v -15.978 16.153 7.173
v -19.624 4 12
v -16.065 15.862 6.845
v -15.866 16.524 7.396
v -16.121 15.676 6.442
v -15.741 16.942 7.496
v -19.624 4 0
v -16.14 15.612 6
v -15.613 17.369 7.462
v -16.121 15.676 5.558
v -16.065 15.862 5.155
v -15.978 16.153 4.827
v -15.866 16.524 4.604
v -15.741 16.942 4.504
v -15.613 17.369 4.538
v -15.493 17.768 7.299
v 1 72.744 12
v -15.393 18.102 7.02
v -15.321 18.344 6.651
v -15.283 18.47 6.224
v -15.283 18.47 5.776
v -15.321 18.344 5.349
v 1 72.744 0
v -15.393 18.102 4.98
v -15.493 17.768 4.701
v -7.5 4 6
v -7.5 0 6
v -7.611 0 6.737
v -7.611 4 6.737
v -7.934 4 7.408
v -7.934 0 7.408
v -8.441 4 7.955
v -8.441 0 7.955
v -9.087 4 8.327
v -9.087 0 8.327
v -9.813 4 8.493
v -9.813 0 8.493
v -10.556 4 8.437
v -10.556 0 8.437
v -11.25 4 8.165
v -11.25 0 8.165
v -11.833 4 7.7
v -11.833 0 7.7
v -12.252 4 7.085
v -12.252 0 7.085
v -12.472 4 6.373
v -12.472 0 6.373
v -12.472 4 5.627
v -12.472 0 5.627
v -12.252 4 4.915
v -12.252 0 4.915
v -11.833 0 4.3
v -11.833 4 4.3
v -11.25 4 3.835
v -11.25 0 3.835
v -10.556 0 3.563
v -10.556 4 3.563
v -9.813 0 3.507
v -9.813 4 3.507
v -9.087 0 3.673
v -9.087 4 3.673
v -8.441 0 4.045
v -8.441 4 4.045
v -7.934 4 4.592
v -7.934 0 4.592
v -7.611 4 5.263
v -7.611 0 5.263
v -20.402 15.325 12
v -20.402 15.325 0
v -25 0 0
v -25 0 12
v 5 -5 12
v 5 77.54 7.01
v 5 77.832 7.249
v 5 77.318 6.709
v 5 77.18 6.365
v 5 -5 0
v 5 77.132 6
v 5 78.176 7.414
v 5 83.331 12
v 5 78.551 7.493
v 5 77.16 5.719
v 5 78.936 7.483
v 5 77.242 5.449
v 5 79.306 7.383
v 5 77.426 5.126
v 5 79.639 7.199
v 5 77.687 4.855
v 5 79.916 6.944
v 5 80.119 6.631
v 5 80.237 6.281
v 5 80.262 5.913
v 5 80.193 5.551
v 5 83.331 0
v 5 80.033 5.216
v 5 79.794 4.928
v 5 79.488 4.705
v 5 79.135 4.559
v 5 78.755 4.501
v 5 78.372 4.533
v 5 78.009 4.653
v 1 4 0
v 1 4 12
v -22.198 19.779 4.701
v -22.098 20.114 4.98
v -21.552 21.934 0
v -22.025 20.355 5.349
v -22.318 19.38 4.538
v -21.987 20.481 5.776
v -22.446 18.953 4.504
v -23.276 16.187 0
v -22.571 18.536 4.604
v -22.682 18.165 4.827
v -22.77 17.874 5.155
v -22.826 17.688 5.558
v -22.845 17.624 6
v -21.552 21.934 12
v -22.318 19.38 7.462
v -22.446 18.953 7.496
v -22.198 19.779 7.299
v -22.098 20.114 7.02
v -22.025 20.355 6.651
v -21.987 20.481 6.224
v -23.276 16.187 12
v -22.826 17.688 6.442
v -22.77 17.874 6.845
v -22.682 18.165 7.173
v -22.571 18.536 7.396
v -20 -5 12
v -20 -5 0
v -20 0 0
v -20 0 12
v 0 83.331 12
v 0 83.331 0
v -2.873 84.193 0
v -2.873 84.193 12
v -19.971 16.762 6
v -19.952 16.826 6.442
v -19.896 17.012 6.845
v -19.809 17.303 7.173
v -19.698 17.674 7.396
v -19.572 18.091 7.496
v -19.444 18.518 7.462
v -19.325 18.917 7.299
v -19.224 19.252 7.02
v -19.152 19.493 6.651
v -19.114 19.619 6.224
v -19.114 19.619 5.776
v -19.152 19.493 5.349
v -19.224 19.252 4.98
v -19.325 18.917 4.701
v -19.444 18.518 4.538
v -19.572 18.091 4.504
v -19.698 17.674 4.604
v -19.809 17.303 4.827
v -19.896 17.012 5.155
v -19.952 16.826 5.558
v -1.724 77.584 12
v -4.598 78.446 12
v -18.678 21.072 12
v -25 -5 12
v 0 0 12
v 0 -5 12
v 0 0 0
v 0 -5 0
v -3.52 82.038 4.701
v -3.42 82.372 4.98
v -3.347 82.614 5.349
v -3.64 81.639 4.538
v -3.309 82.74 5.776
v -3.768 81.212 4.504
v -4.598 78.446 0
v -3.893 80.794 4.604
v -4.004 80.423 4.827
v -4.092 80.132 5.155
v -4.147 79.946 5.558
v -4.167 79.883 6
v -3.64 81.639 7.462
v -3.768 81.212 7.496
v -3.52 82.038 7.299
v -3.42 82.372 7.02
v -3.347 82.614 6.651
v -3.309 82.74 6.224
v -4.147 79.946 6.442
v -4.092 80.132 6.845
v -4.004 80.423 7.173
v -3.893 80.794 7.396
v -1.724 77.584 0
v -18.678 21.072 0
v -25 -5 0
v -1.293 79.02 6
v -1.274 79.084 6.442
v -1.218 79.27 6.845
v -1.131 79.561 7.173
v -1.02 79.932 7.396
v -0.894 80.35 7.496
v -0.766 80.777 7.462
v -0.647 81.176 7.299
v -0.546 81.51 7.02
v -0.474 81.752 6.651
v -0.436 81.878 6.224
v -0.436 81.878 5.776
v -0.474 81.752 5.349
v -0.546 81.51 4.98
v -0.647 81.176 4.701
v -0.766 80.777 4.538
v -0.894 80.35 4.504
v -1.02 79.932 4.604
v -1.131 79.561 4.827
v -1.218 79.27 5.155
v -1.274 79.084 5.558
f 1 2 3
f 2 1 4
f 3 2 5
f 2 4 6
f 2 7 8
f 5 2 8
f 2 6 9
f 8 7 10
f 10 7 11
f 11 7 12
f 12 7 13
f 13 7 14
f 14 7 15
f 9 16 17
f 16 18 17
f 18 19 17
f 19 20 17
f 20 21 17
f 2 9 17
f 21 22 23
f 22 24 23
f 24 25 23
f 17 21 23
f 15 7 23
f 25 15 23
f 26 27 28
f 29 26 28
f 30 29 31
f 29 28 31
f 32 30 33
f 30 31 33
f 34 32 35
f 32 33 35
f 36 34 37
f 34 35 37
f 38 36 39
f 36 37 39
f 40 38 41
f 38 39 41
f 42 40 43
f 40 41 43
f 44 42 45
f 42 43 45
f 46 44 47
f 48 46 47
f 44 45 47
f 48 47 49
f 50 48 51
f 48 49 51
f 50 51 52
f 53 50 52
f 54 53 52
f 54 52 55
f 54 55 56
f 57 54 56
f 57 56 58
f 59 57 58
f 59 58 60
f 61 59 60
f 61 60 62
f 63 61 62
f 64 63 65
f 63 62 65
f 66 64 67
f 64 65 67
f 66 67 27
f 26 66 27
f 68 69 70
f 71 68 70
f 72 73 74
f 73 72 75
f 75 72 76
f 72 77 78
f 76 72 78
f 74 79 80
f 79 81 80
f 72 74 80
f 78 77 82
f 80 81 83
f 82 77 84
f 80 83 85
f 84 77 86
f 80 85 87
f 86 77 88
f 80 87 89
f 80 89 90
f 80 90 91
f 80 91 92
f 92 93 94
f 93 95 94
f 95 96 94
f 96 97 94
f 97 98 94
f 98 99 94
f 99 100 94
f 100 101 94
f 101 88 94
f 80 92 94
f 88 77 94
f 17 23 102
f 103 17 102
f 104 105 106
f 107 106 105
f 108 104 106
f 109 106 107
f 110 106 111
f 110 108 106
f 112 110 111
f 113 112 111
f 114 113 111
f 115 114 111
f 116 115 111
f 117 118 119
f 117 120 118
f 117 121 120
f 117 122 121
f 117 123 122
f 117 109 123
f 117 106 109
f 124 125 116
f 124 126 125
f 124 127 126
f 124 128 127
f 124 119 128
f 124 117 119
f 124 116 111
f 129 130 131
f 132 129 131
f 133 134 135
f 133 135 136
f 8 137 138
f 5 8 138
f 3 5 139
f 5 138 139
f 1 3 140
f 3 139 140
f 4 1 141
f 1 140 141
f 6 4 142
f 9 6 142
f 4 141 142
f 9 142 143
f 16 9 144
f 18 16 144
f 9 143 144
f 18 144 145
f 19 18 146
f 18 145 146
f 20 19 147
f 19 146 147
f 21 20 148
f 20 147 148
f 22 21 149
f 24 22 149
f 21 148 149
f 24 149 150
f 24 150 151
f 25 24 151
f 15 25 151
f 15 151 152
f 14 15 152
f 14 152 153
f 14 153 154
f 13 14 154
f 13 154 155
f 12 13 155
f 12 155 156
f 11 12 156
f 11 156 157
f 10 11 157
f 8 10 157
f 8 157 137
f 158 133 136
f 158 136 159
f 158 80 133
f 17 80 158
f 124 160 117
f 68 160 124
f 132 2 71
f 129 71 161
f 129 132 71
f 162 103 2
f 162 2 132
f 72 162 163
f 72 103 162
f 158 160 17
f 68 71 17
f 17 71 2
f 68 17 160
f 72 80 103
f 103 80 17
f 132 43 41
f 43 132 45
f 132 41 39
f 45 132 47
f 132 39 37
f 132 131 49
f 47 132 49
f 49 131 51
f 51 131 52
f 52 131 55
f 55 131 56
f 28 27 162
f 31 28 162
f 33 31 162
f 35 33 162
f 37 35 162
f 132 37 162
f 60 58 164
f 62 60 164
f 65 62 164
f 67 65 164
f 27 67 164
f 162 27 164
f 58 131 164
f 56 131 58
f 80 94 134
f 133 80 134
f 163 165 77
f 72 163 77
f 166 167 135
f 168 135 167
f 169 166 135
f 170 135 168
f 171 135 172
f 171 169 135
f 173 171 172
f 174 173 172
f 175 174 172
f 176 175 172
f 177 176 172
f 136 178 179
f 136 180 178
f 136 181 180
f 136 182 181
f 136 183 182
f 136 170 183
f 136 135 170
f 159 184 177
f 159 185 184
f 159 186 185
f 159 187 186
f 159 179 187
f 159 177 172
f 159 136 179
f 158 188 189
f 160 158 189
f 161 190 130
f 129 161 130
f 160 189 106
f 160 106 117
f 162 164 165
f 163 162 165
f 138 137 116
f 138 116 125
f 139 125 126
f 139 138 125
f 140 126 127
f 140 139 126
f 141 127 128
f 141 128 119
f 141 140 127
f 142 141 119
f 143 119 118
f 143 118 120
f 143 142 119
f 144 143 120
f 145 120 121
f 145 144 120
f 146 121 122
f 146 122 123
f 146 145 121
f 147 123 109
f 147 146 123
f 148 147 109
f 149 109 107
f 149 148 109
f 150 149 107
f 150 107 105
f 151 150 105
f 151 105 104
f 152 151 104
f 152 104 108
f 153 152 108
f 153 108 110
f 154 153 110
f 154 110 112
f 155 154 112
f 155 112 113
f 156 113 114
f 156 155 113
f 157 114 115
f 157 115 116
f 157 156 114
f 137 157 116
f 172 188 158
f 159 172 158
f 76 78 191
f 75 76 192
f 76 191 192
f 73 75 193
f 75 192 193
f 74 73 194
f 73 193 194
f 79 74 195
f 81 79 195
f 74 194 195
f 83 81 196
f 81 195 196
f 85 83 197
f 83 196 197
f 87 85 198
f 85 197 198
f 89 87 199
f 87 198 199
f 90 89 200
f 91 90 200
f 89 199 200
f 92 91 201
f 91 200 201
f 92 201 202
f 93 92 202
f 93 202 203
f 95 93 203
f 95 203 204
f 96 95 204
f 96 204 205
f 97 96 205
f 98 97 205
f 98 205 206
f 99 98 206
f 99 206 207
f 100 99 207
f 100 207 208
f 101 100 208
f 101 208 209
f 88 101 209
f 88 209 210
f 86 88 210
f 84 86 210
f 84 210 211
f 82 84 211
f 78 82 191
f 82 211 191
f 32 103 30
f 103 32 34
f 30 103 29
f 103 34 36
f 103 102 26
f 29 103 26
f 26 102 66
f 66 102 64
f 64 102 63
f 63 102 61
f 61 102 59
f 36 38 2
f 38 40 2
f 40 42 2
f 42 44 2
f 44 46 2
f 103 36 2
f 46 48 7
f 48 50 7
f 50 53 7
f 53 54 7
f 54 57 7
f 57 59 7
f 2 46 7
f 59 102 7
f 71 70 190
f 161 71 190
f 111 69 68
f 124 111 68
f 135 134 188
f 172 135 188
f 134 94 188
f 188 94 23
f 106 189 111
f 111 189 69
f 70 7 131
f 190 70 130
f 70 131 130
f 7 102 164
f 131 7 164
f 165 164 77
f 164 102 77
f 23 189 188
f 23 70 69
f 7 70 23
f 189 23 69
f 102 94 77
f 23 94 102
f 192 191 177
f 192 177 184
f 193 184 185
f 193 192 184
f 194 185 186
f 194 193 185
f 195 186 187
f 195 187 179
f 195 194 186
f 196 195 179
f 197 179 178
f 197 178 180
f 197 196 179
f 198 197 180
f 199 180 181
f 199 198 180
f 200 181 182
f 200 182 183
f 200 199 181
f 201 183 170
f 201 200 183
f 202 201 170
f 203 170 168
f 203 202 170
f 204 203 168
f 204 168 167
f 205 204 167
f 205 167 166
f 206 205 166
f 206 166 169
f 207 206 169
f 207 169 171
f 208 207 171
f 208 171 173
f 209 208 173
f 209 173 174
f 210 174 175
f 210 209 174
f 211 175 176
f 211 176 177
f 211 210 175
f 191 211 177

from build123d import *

# Parameters (mm, degrees)
F1_DEPTH = 12
F2_R     = 2.5
F3_DEPTH = 4
F4_W     = 6
F4_H     = 12
F4_R     = 1.5
F5_DEPTH = 3
F6_DEPTH = 6.5712102501


with BuildPart() as f1:
    # F0 (on Top) → F1 (new body)
    with BuildSketch(Plane.XY):
        Polygon((-20, -5), (-20, 0), (0, 0), (0, -5), (5, -5), (5, 83.330666624), (0, 83.330666624), (-25, 0), (-25, -5), align=None)
        Polygon((1, 4), (-19.6238279597, 4), (1, 72.743893289), align=None, mode=Mode.SUBTRACT)
    extrude(amount=F1_DEPTH)

    # F2 (on face) → F3 (cut, through all)
    with BuildSketch(Plane.XZ):
        with Locations((-10, 6)):
            Circle(F2_R)
    extrude(amount=-F3_DEPTH, mode=Mode.SUBTRACT)

    # F4 (on face) → F5 (join)
    with BuildSketch(Plane(origin=(-22.9356586075, 6.8809177751, 0), x_dir=(-0.2873563218, -0.9578237543, 0), z_dir=(-0.9578237543, 0.2873563218, 0))):
        with Locations((-76.816091954, 6)):
            Rectangle(F4_W, F4_H)
        with Locations((-76.816091954, 6)):
            Circle(F4_R, mode=Mode.SUBTRACT)
        with Locations((-11.816091954, 6)):
            Rectangle(F4_W, F4_H)
        with Locations((-11.816091954, 6)):
            Circle(F4_R, mode=Mode.SUBTRACT)
    extrude(amount=F5_DEPTH)

    # F4 (on face) → F6 (cut, through all)
    with BuildSketch(Plane(origin=(-22.9356586075, 6.8809177751, 0), x_dir=(-0.2873563218, -0.9578237543, 0), z_dir=(-0.9578237543, 0.2873563218, 0))):
        with Locations((-76.816091954, 6)):
            Circle(F4_R)
        with Locations((-11.816091954, 6)):
            Circle(F4_R)
    extrude(amount=-F6_DEPTH, mode=Mode.SUBTRACT)


solid = f1.part
